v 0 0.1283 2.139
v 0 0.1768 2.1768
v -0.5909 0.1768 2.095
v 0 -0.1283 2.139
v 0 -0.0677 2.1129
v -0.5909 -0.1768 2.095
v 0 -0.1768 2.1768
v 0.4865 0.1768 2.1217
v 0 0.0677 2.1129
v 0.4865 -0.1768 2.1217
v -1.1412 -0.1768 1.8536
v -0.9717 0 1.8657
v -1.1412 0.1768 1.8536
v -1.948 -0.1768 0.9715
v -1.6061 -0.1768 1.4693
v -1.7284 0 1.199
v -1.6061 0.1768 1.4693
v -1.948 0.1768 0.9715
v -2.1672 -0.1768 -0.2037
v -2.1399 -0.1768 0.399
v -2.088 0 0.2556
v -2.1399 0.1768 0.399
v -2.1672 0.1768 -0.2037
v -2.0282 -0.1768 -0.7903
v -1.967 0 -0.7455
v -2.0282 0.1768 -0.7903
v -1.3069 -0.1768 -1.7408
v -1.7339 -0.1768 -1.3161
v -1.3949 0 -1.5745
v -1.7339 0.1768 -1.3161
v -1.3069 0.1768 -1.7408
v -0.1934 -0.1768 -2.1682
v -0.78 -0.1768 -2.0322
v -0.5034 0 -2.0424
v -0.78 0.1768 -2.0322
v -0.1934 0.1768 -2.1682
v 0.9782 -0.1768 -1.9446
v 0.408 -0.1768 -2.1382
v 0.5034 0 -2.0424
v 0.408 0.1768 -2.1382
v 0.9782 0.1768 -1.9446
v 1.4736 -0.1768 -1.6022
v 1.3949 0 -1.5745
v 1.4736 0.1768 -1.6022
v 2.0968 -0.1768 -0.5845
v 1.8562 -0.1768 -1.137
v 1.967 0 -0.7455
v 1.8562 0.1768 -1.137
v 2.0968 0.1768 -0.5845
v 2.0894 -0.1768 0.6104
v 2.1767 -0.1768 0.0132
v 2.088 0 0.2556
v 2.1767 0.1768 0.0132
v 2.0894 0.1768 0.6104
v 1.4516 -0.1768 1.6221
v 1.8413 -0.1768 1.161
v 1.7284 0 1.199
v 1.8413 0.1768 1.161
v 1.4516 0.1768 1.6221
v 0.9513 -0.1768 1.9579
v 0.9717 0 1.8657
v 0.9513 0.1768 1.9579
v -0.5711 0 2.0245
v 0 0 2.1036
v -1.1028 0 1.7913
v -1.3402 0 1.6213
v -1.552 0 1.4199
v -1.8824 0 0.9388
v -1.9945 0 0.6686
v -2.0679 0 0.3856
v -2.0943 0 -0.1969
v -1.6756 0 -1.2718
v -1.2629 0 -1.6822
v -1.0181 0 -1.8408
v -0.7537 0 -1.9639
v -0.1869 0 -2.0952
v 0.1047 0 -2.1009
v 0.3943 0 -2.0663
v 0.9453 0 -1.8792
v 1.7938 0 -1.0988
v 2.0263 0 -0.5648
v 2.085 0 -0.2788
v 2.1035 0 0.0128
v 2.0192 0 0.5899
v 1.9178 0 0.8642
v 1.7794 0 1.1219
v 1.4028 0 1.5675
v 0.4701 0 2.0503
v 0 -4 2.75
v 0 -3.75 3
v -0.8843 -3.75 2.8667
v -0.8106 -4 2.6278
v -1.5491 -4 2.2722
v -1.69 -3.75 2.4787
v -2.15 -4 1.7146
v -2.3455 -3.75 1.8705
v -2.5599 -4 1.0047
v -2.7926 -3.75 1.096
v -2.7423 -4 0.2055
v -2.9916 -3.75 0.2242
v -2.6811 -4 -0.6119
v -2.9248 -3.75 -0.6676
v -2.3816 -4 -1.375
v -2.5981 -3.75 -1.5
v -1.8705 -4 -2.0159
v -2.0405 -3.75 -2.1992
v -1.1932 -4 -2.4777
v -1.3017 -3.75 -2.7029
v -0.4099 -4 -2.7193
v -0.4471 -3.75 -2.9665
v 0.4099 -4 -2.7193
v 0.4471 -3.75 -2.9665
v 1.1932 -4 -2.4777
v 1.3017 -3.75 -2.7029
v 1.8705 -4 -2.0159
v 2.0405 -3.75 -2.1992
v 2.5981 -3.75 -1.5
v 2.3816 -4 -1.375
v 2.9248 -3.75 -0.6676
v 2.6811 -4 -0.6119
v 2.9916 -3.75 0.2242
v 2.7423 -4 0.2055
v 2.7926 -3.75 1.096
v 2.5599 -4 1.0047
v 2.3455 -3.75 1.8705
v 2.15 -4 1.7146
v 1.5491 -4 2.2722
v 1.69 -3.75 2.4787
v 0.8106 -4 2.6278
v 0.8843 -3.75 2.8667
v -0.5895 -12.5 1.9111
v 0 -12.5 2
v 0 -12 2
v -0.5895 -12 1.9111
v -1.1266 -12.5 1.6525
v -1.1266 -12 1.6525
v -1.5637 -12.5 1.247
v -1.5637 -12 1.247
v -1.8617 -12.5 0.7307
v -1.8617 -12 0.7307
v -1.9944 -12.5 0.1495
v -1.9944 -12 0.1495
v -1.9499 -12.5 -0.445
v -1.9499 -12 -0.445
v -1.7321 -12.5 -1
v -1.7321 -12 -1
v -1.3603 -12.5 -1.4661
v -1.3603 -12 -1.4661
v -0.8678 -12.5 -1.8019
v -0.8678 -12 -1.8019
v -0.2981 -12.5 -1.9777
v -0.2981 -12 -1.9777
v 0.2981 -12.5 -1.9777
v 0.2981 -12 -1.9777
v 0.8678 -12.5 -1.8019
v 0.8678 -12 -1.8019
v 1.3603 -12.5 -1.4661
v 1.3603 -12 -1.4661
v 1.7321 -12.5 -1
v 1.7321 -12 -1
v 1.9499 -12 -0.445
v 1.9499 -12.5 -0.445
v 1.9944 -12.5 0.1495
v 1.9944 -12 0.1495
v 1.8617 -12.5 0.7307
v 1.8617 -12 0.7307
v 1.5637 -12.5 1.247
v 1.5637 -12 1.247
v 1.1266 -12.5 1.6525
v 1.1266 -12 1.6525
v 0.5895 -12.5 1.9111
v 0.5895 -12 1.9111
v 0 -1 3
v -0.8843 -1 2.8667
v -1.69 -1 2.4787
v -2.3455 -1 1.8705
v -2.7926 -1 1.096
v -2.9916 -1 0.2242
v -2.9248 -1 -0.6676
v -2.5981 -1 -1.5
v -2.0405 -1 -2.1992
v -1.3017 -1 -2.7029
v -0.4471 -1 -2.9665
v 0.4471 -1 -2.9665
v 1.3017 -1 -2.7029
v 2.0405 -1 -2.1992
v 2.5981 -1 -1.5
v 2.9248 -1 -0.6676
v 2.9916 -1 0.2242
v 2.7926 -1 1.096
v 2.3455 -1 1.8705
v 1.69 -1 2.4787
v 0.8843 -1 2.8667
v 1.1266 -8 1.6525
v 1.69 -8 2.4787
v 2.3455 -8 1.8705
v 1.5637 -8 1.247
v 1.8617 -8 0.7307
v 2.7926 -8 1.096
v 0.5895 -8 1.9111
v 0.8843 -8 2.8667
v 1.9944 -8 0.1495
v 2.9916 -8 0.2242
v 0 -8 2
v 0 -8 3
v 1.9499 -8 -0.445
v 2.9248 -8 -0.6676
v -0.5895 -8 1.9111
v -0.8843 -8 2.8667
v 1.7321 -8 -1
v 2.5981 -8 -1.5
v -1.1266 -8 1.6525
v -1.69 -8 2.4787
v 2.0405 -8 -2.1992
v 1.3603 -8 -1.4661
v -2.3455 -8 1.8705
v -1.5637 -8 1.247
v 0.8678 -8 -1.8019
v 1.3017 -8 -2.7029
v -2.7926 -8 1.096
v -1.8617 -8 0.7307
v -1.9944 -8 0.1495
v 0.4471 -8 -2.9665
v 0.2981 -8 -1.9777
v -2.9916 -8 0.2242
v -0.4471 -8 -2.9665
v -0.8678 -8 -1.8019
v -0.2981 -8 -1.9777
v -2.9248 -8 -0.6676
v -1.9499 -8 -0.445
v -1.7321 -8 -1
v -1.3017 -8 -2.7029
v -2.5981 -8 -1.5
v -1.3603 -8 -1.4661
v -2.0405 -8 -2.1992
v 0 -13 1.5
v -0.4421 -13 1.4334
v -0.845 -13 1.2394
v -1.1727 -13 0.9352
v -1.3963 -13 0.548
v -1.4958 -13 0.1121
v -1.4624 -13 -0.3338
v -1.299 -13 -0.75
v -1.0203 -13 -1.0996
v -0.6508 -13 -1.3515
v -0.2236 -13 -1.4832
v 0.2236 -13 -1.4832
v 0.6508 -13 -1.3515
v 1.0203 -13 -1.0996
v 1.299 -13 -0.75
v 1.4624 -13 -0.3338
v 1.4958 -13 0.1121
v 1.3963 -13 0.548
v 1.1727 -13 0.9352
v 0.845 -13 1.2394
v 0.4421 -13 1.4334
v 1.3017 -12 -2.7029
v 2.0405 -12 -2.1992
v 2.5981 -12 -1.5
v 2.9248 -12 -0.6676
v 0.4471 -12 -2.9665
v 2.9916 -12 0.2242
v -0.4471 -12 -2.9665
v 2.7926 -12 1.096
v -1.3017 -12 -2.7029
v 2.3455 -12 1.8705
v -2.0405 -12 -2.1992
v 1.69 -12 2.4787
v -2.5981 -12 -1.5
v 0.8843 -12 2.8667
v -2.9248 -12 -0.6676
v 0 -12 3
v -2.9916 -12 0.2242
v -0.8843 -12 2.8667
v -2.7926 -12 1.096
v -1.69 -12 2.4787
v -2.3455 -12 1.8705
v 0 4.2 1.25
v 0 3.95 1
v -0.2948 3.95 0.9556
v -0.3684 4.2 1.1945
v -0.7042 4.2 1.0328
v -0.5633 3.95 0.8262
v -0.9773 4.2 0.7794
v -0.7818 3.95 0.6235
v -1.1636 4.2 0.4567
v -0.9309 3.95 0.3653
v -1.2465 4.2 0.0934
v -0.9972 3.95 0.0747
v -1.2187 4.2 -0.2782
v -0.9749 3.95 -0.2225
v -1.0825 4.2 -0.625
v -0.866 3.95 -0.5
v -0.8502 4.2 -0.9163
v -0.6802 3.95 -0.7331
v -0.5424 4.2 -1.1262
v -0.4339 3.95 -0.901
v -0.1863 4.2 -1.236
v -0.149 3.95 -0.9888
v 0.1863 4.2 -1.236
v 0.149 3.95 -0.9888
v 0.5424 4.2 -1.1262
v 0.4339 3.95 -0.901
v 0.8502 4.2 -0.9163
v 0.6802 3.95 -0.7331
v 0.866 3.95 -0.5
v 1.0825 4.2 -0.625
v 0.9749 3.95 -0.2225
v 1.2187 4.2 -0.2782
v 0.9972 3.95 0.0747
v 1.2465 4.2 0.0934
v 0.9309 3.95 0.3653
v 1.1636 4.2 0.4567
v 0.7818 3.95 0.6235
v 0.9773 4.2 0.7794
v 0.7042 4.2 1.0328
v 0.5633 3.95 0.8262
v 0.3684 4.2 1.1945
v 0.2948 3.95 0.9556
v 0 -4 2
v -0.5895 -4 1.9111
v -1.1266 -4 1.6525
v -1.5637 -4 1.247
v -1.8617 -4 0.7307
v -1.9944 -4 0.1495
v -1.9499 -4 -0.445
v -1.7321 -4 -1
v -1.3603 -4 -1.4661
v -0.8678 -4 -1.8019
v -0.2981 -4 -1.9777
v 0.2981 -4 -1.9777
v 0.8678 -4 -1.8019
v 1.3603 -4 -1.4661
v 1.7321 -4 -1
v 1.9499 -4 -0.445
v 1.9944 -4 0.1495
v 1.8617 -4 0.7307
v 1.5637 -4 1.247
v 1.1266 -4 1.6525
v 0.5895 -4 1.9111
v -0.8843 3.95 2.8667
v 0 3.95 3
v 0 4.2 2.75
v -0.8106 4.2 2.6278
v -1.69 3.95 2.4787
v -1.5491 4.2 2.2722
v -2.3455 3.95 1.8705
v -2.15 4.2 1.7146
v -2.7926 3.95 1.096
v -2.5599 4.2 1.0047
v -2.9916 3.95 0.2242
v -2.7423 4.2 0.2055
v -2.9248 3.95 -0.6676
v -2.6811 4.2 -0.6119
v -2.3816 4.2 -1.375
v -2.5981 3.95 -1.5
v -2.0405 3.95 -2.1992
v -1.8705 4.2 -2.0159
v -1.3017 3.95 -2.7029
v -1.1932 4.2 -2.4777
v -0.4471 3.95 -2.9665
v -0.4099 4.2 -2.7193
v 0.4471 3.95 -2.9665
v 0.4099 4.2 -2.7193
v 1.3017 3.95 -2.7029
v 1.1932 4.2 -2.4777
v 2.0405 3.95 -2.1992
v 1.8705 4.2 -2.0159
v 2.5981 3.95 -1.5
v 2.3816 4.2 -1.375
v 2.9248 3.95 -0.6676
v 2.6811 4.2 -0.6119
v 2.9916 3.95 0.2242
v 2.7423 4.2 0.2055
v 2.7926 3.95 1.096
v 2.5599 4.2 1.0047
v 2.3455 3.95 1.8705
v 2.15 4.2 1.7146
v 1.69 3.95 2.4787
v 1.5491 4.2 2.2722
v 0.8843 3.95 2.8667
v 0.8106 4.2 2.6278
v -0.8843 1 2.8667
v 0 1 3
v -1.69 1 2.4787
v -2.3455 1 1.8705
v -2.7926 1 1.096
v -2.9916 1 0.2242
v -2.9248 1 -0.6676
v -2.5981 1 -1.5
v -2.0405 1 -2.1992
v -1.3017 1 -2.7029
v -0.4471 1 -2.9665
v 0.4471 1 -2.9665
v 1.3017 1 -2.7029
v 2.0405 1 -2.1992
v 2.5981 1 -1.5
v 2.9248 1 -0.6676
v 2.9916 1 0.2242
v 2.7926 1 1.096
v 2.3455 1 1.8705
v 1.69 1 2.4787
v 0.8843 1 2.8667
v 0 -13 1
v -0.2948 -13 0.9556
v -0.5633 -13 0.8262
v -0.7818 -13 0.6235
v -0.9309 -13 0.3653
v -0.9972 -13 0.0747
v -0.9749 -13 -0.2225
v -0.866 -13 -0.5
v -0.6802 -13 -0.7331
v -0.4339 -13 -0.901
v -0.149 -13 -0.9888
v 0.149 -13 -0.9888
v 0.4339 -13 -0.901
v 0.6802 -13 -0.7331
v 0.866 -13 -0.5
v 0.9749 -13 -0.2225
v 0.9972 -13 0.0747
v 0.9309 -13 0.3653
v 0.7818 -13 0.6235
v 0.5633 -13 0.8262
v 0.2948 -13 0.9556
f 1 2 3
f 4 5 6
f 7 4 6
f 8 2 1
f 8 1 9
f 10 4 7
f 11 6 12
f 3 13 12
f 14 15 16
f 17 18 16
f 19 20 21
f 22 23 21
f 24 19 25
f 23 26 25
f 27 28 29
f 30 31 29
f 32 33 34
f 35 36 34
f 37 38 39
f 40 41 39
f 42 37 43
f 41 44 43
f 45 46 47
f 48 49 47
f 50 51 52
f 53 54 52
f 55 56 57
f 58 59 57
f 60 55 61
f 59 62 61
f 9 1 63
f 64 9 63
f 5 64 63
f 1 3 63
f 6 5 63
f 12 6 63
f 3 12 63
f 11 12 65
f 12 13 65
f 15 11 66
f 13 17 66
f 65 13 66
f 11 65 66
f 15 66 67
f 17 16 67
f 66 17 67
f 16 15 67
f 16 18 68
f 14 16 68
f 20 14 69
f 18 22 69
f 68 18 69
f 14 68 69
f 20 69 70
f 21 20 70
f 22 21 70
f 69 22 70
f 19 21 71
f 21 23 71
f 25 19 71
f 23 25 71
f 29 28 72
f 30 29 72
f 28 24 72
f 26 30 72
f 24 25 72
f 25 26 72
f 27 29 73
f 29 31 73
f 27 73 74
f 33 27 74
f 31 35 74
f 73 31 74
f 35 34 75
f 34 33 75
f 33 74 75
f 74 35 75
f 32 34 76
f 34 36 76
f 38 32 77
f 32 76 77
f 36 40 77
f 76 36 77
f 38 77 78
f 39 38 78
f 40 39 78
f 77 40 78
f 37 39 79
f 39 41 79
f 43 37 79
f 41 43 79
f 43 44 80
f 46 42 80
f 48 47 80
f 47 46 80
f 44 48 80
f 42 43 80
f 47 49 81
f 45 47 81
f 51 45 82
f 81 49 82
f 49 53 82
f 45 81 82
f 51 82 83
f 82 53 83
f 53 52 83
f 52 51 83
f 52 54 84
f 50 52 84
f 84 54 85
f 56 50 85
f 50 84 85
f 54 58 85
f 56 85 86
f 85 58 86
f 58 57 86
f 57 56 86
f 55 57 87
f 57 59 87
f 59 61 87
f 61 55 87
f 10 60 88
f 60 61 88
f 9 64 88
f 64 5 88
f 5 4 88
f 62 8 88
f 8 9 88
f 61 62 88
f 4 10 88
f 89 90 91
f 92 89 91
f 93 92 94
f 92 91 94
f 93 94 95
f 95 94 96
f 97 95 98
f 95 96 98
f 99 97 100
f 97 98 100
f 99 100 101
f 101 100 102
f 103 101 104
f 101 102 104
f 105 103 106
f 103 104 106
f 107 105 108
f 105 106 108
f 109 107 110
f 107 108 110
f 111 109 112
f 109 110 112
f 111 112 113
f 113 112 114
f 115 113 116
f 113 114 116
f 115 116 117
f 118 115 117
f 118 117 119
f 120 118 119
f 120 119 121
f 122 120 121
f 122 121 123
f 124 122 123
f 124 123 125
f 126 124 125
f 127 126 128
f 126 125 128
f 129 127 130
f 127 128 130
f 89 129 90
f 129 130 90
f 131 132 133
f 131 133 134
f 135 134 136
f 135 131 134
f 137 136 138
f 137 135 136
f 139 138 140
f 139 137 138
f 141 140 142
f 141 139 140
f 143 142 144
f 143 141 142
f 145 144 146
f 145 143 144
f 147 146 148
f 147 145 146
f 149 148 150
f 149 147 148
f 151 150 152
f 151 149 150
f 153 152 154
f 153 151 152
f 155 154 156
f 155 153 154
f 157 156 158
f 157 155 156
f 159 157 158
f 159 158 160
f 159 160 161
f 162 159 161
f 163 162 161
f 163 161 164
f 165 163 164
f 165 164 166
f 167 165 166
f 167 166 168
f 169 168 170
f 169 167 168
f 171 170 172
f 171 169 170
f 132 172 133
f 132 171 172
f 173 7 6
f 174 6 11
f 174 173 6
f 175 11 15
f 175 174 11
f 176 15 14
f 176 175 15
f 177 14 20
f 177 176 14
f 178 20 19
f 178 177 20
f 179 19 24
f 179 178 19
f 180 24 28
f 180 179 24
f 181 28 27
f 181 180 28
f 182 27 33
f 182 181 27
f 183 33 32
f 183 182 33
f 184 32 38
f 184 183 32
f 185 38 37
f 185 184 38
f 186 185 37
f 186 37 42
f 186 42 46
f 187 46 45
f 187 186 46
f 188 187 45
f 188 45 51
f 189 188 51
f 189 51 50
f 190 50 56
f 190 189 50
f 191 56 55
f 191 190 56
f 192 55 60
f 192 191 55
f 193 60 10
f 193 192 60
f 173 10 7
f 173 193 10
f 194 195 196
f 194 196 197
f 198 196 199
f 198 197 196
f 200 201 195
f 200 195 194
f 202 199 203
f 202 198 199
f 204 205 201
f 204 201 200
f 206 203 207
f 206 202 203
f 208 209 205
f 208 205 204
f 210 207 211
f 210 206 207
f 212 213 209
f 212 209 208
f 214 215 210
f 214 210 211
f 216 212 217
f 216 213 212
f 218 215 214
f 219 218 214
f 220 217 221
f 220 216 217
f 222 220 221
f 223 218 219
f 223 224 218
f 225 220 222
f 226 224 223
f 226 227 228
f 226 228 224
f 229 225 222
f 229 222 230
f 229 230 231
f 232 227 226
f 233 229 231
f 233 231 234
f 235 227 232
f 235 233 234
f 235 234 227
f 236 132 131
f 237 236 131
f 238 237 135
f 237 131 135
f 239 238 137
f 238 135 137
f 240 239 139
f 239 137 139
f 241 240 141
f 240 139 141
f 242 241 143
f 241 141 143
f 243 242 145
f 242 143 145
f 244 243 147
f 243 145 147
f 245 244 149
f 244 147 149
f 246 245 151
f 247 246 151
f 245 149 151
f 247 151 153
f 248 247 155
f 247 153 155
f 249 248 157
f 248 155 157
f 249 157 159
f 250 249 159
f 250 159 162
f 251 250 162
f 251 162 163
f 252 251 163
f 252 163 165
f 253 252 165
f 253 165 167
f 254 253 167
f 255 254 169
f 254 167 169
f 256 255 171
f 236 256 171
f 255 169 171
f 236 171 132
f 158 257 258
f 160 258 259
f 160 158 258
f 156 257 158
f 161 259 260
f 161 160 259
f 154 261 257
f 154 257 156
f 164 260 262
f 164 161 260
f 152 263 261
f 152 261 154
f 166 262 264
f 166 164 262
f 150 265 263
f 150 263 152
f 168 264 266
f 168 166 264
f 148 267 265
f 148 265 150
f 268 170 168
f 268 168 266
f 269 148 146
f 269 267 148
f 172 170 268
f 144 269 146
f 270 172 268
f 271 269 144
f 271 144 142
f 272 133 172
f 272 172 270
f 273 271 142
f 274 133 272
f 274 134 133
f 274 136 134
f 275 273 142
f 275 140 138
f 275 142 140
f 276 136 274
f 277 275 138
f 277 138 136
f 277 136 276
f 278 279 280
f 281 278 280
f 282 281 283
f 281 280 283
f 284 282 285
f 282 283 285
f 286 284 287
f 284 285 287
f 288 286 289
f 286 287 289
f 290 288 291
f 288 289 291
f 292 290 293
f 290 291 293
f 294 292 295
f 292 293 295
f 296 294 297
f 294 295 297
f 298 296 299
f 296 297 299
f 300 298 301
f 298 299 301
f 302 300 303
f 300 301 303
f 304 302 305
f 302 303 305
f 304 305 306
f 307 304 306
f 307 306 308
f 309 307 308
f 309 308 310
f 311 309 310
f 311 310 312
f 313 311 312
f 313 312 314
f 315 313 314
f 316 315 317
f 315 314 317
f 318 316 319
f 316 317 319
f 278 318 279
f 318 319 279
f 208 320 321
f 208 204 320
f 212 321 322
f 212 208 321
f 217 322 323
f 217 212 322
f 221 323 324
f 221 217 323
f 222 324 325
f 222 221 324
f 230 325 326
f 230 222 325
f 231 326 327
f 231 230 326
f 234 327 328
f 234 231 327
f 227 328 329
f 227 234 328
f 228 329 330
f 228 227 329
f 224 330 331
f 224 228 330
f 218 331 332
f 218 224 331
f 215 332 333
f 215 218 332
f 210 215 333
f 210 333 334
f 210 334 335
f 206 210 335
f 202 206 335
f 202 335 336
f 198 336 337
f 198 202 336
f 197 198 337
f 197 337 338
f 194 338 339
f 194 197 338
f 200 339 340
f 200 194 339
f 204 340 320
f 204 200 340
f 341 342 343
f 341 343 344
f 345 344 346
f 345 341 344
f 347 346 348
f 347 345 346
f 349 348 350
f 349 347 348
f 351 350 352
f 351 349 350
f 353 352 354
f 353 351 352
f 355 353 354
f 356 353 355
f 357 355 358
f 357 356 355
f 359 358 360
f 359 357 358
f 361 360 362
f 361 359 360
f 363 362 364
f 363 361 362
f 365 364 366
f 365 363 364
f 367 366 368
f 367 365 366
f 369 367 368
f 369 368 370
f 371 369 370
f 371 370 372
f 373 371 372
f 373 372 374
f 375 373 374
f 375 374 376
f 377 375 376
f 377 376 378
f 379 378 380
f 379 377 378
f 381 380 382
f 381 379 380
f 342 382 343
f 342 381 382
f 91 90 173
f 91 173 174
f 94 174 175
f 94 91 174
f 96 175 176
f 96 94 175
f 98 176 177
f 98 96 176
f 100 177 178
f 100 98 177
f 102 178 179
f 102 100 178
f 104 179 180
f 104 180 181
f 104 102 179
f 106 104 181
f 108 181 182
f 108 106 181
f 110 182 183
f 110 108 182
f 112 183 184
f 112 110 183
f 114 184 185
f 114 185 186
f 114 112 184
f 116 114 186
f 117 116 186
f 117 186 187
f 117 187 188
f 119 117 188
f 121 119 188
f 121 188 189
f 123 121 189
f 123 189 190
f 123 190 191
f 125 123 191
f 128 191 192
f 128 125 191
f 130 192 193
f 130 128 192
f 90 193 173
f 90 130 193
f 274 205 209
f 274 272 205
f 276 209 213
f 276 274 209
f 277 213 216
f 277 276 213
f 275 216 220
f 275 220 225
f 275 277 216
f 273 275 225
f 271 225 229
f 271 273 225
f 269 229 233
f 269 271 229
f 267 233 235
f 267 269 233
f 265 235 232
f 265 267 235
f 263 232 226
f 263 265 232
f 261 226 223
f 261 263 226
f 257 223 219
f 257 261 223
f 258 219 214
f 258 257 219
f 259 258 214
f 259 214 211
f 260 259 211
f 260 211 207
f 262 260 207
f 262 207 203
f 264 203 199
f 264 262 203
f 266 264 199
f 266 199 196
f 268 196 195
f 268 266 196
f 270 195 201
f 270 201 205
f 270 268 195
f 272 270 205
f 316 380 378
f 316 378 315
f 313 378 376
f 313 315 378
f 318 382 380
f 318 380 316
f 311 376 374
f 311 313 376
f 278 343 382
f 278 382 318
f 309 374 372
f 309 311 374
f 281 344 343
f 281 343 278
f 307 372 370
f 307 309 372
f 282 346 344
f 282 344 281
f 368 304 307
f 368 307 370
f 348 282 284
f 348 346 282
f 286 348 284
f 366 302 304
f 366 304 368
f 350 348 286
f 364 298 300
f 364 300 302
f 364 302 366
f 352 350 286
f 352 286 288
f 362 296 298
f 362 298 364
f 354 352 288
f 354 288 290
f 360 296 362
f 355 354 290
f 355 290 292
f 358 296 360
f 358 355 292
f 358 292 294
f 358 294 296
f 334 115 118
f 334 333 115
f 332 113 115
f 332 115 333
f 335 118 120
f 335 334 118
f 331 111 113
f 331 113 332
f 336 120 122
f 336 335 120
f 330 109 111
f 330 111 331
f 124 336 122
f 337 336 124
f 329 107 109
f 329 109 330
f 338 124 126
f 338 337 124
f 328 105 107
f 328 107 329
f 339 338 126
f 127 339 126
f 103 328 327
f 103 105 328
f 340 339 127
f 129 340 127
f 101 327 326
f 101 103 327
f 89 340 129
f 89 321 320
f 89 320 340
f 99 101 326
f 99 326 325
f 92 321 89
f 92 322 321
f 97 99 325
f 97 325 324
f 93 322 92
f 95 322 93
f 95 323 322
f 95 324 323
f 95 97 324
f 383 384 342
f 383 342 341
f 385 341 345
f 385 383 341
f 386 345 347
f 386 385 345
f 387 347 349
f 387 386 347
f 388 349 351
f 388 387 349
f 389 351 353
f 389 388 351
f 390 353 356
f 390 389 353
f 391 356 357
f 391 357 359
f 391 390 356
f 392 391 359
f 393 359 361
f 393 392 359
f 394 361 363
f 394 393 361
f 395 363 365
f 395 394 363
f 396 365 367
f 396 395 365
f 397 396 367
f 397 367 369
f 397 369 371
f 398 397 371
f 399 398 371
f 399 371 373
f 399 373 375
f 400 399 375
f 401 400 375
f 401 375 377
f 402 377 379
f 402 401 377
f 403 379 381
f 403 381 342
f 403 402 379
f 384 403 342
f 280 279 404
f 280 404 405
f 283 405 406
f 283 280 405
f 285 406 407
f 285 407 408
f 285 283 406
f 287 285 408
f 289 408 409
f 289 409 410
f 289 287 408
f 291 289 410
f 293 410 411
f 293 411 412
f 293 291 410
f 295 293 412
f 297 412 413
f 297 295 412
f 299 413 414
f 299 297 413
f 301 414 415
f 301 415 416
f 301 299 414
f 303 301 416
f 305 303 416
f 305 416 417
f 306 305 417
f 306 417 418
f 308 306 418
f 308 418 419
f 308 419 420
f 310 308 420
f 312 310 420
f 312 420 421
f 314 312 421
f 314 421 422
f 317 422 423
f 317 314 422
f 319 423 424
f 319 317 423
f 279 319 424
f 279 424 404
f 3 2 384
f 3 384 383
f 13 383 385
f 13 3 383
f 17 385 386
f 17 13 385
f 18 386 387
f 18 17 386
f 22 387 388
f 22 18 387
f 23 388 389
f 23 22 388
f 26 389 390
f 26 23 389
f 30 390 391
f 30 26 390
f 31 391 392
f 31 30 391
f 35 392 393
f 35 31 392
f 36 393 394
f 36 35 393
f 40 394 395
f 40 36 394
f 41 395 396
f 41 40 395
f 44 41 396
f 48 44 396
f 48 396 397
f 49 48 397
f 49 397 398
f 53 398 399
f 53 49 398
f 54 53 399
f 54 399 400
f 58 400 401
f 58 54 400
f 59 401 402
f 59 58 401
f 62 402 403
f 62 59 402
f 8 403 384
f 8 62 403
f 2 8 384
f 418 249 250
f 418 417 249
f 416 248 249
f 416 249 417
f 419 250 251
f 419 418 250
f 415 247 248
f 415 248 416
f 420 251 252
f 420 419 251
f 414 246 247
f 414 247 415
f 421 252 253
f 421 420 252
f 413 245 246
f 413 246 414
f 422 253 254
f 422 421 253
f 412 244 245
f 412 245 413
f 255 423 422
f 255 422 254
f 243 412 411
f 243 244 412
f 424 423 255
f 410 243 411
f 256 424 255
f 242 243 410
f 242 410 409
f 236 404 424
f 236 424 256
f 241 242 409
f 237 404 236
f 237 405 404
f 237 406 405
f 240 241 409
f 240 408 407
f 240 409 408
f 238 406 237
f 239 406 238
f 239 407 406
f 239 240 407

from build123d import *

# Parameters (mm, degrees)
CHAMFER1_SIZE = 0.25
CHAMFER3_SIZE = 0.5
CHAMFER4_SIZE = 0.25
FILLET1_R     = 0.25


with BuildPart() as part:
    # Sketch1 → Revolve1 (revolve)
    with BuildSketch(Plane.XY, mode=Mode.PRIVATE) as revolve1_sk:
        Polygon((-1, 4.2), (-3, 4.2), (-3, 1), (-2, 0), (-3, -1), (-3, -4), (-2, -4), (-2, -8), (-3, -8), (-3, -12), (-2, -12), (-2, -13), (-1, -13), align=None)
    revolve(revolve1_sk.sketch.rotate(Axis((0, 54.199953661, 0), (0, -1, 0)), 270), axis=Axis((0, 54.199953661, 0), (0, -1, 0)))

    # Chamfer1
    chamfer1_edges = [part.edges().sort_by_distance(p)[0] for p in [
        (0, 4.2, -1),
    ]]
    chamfer(chamfer1_edges, length=CHAMFER1_SIZE)

    # Chamfer3
    chamfer3_edges = [part.edges().sort_by_distance(p)[0] for p in [
        (0, -13, -2),
    ]]
    chamfer(chamfer3_edges, length=CHAMFER3_SIZE)

    # Chamfer4
    chamfer4_edges = [part.edges().sort_by_distance(p)[0] for p in [
        (0, -4, -3),
        (0, 4.2, -3),
    ]]
    chamfer(chamfer4_edges, length=CHAMFER4_SIZE)

    # Fillet1
    fillet1_edges = [part.edges().sort_by_distance(p)[0] for p in [
        (0, 0, -2),
    ]]
    fillet(fillet1_edges, radius=FILLET1_R)


solid = part.part
